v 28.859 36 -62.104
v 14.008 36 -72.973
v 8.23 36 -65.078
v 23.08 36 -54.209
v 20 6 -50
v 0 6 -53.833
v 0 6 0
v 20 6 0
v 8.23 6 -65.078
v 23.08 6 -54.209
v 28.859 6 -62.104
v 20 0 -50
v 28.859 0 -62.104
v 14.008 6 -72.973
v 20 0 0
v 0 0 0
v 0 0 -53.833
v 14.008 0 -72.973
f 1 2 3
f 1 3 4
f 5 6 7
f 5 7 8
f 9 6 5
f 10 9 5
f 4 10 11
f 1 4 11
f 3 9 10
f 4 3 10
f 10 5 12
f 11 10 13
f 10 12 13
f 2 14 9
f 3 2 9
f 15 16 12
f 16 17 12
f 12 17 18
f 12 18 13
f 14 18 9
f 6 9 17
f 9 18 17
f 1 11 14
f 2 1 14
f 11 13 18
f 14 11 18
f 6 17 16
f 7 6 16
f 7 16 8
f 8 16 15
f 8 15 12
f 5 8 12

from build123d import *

# Parameters (mm, degrees)
BOSS_EXTRUDE1_DEPTH = 6
BOSS_EXTRUDE2_DEPTH = 30


with BuildPart() as part:
    # Sketch1 → Boss-Extrude1 (new body)
    with BuildSketch(Plane(origin=(0, 0, 0), x_dir=(1, 0, 0), z_dir=(0, 1, 0))):
        Polygon((0, 0), (20, 0), (20, 50), (28.859023883, 62.104449423), (14.00827122, 72.973442133), (0, 53.833363868), align=None)
    extrude(amount=BOSS_EXTRUDE1_DEPTH)

    # Sketch2 → Boss-Extrude2 (add)
    with BuildSketch(Plane(origin=(0, 6, 0), x_dir=(1, 0, 0), z_dir=(0, 1, 0))):
        Polygon((14.00827122, 72.973442133), (8.22967873, 65.077913072), (23.080431394, 54.208920362), (28.859023883, 62.104449423), align=None)
    extrude(amount=BOSS_EXTRUDE2_DEPTH)


solid = part.part
